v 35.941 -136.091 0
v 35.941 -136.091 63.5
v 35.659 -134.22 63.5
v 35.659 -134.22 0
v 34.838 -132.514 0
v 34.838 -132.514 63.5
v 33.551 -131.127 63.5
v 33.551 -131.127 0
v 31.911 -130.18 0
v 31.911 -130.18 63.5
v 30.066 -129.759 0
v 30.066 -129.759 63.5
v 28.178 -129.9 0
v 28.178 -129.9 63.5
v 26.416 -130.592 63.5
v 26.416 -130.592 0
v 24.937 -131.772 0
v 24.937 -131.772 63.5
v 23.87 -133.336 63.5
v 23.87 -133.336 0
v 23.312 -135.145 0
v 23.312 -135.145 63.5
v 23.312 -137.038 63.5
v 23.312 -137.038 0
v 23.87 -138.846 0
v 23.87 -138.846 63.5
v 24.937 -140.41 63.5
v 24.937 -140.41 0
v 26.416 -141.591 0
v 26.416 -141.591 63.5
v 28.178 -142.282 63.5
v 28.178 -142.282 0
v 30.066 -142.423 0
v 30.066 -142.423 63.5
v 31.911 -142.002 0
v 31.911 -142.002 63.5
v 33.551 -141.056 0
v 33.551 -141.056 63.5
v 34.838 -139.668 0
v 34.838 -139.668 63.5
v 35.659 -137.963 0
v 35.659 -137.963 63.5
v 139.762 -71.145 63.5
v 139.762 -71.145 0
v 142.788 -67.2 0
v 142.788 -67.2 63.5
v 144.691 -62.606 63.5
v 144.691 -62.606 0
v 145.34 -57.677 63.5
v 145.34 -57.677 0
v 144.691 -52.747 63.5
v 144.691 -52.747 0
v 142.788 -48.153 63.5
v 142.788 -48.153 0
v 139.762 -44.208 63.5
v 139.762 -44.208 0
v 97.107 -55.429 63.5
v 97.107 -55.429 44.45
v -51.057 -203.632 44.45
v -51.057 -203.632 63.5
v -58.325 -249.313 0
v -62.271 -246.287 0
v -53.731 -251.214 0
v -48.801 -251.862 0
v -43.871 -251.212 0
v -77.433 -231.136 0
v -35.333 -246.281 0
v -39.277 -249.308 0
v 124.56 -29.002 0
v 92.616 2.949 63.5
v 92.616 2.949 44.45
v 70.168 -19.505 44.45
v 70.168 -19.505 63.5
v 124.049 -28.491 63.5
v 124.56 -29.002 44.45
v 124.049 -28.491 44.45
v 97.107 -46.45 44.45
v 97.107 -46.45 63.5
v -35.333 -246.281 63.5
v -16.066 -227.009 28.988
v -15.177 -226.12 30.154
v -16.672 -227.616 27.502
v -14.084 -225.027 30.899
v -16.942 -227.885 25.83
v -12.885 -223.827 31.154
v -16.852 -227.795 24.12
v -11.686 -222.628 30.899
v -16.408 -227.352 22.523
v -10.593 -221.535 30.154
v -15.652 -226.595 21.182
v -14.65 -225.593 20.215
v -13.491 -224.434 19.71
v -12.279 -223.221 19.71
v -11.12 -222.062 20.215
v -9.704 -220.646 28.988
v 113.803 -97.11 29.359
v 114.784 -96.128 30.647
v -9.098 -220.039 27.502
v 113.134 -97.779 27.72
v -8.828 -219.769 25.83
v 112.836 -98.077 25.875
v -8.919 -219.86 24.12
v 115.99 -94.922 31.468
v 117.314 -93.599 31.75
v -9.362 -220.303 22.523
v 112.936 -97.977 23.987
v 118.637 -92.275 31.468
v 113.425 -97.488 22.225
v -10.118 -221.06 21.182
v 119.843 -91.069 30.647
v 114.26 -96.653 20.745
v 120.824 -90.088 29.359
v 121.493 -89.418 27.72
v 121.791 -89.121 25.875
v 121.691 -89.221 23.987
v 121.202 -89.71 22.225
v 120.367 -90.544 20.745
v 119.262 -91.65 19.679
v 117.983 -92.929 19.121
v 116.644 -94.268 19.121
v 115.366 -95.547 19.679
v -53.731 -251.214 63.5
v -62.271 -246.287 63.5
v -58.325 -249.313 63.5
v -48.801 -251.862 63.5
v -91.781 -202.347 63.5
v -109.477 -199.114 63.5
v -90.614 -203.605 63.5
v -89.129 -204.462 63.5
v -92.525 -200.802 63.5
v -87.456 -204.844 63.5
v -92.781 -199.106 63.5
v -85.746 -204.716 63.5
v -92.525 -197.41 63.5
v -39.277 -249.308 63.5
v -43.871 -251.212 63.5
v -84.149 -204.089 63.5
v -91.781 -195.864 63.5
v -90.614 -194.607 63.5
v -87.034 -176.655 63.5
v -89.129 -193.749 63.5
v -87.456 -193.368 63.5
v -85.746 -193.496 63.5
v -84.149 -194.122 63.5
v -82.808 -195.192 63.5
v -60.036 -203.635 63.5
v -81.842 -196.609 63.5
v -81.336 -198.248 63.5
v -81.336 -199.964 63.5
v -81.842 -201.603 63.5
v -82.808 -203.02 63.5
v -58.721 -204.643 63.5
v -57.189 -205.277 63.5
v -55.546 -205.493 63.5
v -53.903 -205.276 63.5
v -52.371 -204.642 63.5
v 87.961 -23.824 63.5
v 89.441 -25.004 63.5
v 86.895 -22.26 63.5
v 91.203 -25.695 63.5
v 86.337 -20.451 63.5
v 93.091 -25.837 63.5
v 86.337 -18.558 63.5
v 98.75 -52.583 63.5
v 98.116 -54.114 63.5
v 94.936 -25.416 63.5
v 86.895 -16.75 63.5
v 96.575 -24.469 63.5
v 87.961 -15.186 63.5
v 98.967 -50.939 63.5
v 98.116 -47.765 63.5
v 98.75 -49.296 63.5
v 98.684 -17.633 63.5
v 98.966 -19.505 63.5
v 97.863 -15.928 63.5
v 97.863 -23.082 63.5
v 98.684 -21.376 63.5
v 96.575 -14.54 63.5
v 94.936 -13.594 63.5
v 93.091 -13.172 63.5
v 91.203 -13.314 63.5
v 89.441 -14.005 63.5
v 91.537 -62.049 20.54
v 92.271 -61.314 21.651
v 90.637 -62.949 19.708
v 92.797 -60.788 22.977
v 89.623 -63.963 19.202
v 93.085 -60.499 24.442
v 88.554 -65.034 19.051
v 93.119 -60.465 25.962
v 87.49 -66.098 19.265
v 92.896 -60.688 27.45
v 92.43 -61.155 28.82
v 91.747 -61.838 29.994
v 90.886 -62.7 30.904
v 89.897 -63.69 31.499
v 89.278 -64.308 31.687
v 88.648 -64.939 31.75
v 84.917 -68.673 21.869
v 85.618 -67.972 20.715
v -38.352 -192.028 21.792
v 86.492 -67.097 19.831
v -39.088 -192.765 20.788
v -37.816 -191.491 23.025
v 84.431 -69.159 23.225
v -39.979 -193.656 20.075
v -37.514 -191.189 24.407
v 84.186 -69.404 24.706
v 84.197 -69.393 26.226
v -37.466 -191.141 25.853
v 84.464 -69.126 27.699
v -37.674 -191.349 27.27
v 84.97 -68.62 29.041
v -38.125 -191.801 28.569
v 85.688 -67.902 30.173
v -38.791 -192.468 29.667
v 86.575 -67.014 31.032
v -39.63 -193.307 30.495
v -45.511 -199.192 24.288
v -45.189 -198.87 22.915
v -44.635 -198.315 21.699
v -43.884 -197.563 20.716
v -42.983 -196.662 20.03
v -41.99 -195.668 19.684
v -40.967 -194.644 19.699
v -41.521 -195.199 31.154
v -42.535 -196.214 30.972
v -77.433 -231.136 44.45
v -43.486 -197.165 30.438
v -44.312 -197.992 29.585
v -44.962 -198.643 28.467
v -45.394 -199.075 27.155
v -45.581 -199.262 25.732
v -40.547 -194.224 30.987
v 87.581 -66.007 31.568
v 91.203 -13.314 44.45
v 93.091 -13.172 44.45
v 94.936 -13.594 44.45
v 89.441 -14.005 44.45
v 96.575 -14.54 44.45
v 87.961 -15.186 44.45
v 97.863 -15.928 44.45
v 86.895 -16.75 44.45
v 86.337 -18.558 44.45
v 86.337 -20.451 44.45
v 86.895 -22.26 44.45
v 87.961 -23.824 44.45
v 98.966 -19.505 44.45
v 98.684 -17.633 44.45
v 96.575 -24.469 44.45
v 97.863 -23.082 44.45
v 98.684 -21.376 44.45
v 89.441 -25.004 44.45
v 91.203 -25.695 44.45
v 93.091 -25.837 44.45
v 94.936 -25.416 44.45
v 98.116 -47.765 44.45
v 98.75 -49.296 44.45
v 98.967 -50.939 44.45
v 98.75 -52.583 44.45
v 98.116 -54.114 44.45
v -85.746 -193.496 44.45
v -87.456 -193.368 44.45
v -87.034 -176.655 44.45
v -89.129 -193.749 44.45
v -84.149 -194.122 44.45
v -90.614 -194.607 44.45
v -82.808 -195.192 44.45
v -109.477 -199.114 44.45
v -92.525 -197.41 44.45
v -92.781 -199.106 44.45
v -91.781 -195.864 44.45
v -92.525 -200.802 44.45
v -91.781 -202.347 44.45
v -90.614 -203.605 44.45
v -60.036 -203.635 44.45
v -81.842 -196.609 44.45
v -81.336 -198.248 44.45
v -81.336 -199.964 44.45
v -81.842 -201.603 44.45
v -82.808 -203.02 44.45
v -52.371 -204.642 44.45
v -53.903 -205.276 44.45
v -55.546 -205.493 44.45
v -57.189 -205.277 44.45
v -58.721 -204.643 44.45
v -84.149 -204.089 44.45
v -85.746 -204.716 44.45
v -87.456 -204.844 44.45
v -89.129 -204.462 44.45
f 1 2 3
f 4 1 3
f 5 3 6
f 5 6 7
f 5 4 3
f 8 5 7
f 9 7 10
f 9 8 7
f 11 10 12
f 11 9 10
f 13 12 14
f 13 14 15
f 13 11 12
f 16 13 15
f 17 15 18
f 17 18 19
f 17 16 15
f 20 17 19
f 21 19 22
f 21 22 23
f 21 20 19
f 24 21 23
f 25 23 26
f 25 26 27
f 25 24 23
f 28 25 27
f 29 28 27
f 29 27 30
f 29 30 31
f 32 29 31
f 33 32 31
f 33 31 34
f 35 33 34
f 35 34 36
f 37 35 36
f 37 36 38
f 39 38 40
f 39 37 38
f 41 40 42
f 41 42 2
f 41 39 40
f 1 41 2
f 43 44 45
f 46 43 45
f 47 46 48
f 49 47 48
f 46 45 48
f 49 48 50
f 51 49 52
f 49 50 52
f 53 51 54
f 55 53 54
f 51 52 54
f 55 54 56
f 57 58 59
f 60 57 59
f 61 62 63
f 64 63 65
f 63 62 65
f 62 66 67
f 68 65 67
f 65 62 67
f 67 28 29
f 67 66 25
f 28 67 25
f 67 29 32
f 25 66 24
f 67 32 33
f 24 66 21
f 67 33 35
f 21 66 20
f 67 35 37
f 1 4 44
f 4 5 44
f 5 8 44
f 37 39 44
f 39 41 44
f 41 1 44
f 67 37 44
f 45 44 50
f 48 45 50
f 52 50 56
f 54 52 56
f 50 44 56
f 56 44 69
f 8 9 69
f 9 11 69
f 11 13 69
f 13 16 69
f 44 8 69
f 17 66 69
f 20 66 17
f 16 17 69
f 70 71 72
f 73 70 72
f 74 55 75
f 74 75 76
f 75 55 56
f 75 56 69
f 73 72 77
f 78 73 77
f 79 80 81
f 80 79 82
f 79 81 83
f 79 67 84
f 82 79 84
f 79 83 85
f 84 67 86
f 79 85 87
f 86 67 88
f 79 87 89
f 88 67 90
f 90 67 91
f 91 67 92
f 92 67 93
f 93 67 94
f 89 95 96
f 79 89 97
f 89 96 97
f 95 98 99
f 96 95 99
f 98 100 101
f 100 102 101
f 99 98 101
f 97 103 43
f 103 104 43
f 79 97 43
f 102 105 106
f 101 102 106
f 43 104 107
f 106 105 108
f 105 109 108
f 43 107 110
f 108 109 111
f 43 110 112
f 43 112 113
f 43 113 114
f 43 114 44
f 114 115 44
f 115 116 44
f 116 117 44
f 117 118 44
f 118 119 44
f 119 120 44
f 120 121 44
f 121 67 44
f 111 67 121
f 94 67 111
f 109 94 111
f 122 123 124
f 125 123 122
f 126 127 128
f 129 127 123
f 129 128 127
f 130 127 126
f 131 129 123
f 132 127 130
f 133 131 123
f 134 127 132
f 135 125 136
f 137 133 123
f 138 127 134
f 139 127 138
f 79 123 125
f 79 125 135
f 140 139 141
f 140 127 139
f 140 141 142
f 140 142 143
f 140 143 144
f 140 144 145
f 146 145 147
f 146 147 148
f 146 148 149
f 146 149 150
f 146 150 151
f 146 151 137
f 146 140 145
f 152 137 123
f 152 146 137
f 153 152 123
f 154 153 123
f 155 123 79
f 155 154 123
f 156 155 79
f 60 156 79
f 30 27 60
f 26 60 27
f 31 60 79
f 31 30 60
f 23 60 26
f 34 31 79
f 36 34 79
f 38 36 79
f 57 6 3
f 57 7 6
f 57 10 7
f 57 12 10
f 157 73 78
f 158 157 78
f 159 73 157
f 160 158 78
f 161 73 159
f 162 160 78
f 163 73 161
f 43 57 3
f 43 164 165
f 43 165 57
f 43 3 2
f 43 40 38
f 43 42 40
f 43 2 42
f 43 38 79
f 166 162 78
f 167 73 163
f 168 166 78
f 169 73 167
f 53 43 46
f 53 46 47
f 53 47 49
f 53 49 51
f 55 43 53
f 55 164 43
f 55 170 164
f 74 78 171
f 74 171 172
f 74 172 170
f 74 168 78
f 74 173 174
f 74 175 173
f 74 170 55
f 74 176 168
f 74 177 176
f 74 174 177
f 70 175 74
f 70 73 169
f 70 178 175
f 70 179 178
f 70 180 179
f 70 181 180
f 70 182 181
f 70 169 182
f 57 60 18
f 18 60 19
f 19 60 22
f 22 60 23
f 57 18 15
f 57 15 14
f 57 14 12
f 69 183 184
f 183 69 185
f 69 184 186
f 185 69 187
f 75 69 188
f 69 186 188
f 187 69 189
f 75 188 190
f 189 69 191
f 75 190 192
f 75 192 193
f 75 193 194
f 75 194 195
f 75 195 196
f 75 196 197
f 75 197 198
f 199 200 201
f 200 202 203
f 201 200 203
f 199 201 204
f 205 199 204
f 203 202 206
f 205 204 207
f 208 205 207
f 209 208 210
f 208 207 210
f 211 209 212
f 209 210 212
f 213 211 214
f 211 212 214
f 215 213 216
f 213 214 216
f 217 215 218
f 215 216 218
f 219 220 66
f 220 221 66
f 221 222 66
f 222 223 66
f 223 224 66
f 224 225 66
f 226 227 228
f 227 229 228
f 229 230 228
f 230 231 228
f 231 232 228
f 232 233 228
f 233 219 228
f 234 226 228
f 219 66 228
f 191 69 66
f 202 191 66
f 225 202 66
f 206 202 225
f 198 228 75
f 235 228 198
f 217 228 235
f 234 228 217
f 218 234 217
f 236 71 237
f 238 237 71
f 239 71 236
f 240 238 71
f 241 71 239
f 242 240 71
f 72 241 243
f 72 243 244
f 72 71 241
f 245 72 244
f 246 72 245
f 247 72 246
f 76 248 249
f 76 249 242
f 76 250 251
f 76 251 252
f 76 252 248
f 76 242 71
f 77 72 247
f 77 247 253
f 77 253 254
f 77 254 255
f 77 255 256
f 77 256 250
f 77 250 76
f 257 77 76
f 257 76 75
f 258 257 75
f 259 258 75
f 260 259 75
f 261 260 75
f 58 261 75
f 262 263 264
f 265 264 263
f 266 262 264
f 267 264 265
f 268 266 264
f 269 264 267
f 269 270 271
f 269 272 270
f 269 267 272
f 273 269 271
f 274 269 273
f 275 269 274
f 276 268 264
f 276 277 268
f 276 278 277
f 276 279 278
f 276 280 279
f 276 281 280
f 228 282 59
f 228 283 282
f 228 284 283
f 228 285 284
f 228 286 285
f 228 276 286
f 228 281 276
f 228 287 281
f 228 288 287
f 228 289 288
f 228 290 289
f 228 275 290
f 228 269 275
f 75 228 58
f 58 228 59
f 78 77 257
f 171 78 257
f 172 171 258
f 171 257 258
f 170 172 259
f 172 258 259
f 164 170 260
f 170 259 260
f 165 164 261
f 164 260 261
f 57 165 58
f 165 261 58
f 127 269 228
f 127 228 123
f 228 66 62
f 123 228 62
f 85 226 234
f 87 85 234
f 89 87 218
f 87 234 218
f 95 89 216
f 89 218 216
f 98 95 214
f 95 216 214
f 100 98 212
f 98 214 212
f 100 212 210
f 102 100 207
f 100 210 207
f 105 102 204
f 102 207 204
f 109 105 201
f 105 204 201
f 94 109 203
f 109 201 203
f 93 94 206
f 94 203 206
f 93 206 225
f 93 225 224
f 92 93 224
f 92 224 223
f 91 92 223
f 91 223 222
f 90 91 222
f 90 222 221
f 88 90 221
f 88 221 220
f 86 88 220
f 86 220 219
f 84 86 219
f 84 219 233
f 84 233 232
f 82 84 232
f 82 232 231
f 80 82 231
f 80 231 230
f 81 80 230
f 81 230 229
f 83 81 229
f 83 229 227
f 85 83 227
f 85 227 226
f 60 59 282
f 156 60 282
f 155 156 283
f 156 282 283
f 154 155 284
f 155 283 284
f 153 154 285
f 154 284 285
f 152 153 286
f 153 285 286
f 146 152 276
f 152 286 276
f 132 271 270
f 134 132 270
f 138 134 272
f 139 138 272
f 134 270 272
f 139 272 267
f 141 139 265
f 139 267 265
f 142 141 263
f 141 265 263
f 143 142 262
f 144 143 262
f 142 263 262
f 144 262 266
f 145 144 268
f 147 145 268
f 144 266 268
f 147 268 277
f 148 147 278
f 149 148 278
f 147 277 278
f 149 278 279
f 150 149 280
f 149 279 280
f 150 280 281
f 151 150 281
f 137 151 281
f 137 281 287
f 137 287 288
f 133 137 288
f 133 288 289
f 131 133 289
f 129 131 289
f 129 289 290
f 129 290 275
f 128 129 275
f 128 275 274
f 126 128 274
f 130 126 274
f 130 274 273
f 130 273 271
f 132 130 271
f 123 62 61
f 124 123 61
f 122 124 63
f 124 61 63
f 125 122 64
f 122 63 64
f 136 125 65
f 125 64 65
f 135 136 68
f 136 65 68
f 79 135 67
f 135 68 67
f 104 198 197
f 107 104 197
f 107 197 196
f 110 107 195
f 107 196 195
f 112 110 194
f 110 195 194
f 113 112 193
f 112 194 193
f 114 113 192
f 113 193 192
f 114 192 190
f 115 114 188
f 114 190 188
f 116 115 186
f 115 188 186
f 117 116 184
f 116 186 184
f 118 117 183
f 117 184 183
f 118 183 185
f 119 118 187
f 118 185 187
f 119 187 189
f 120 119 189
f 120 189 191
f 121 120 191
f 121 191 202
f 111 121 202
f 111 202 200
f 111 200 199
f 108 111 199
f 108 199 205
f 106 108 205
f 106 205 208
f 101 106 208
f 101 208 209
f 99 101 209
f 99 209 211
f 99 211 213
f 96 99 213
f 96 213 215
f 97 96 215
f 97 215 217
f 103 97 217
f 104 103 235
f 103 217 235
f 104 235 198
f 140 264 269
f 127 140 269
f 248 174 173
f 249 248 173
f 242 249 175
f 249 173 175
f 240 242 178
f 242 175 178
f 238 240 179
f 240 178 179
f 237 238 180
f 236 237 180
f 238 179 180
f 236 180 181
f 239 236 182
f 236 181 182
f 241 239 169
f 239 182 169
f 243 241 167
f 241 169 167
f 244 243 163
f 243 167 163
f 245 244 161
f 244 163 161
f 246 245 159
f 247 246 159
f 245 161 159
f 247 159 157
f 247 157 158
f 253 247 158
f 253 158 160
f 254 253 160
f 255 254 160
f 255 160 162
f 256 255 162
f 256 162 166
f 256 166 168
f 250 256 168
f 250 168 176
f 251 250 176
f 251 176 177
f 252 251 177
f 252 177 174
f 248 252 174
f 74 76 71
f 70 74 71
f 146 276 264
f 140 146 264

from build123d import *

# Parameters (mm, degrees)
SKETCH1_R                         = 6.35
BASE_EXTRUDE_DEPTH                = 63.5
SKETCH2_W                         = 45.301656397
SKETCH2_H                         = 44.45
CUT_EXTRUDE1_DEPTH                = 324.049195456
F_1_2_20_TAPPED_HOLE4_D           = 11.50874
F_1_2_20_TAPPED_HOLE3_D           = 11.50874
F_1_2_20_TAPPED_HOLE3_CBORE_D     = 12.7
F_1_2_20_TAPPED_HOLE3_CBORE_DEPTH = 25.4
F_1_2_20_TAPPED_HOLE1_D           = 12.7
F_1_2_20_TAPPED_HOLE2_D           = 11.50874


with BuildPart() as part:
    # Sketch1 → Base-Extrude (new body)
    with BuildSketch(Plane.XY):
        with BuildLine():
            Line((-87.034046036, -176.655263526), (-109.476853925, -199.11373351))
            Line((-109.476853925, -199.11373351), (-62.270703318, -246.286963476))
            ThreePointArc((-62.270703318, -246.286963476), (-48.800588675, -251.86188097), (-35.333068284, -246.280699366))
            Line((-35.333068284, -246.280699366), (139.761564896, -71.145344736))
            ThreePointArc((139.761564896, -71.145344736), (145.339614596, -57.676526855), (139.761564896, -44.207708974))
            Line((139.761564896, -44.207708974), (124.048977285, -28.491467114))
            Line((124.048977285, -28.491467114), (92.616039983, 2.948780491))
            Line((92.616039983, 2.948780491), (70.168405011, -19.504866145))
            Line((70.168405011, -19.504866145), (97.107164721, -46.449890955))
            ThreePointArc((97.107164721, -46.449890955), (98.966514621, -50.939440985), (97.107243808, -55.429023769))
            Line((97.107243808, -55.429023769), (-51.056538279, -203.63248535))
            ThreePointArc((-51.056538279, -203.63248535), (-55.545734899, -205.492958311), (-60.035829043, -203.634652493))
            Line((-60.035829043, -203.634652493), (-87.034046036, -176.655263526))
        make_face()
        with Locations((29.591473015, -136.091254995)):
            Circle(SKETCH1_R, mode=Mode.SUBTRACT)
    extrude(amount=BASE_EXTRUDE_DEPTH)

    # Sketch2 → Cut-Extrude1 (cut, through all)
    with BuildSketch(Plane(origin=(-154.257082678, -154.364733609, 0), x_dir=(0.707353385, -0.706860091, 0), z_dir=(-0.706860091, -0.707353385, 0))):
        with Locations((85.957556745, 22.225)):
            Rectangle(SKETCH2_W, SKETCH2_H)
    extrude(amount=-CUT_EXTRUDE1_DEPTH, mode=Mode.SUBTRACT)

    # 1/2-20 Tapped Hole4 (through all)
    with Locations(Plane.XY.offset(63.5)):
        with Locations((-87.026214989, -199.105902462)):
            Hole(F_1_2_20_TAPPED_HOLE4_D / 2)

    # 1/2-20 Tapped Hole3 (through all)
    with Locations(Plane.XY.offset(63.5)):
        with Locations((92.616237749, -19.504668428)):
            CounterBoreHole(F_1_2_20_TAPPED_HOLE3_D / 2, F_1_2_20_TAPPED_HOLE3_CBORE_D / 2, F_1_2_20_TAPPED_HOLE3_CBORE_DEPTH)

    # 1/2-20 Tapped Hole1 (through all)
    with Locations(Plane(origin=(105.469704015, -105.445180815, 0), x_dir=(0, 0, -1), z_dir=(0.707188992, -0.707024561, 0))):
        with Locations((-25.4, 16.751653867)):
            Hole(F_1_2_20_TAPPED_HOLE1_D / 2)

    # 1/2-20 Tapped Hole2 (through all)
    with Locations(Plane(origin=(105.469704015, -105.445180815, 0), x_dir=(0, 0, -1), z_dir=(0.707188992, -0.707024561, 0))):
        with Locations((-25.4, -167.398346133)):
            Hole(F_1_2_20_TAPPED_HOLE2_D / 2)


solid = part.part
